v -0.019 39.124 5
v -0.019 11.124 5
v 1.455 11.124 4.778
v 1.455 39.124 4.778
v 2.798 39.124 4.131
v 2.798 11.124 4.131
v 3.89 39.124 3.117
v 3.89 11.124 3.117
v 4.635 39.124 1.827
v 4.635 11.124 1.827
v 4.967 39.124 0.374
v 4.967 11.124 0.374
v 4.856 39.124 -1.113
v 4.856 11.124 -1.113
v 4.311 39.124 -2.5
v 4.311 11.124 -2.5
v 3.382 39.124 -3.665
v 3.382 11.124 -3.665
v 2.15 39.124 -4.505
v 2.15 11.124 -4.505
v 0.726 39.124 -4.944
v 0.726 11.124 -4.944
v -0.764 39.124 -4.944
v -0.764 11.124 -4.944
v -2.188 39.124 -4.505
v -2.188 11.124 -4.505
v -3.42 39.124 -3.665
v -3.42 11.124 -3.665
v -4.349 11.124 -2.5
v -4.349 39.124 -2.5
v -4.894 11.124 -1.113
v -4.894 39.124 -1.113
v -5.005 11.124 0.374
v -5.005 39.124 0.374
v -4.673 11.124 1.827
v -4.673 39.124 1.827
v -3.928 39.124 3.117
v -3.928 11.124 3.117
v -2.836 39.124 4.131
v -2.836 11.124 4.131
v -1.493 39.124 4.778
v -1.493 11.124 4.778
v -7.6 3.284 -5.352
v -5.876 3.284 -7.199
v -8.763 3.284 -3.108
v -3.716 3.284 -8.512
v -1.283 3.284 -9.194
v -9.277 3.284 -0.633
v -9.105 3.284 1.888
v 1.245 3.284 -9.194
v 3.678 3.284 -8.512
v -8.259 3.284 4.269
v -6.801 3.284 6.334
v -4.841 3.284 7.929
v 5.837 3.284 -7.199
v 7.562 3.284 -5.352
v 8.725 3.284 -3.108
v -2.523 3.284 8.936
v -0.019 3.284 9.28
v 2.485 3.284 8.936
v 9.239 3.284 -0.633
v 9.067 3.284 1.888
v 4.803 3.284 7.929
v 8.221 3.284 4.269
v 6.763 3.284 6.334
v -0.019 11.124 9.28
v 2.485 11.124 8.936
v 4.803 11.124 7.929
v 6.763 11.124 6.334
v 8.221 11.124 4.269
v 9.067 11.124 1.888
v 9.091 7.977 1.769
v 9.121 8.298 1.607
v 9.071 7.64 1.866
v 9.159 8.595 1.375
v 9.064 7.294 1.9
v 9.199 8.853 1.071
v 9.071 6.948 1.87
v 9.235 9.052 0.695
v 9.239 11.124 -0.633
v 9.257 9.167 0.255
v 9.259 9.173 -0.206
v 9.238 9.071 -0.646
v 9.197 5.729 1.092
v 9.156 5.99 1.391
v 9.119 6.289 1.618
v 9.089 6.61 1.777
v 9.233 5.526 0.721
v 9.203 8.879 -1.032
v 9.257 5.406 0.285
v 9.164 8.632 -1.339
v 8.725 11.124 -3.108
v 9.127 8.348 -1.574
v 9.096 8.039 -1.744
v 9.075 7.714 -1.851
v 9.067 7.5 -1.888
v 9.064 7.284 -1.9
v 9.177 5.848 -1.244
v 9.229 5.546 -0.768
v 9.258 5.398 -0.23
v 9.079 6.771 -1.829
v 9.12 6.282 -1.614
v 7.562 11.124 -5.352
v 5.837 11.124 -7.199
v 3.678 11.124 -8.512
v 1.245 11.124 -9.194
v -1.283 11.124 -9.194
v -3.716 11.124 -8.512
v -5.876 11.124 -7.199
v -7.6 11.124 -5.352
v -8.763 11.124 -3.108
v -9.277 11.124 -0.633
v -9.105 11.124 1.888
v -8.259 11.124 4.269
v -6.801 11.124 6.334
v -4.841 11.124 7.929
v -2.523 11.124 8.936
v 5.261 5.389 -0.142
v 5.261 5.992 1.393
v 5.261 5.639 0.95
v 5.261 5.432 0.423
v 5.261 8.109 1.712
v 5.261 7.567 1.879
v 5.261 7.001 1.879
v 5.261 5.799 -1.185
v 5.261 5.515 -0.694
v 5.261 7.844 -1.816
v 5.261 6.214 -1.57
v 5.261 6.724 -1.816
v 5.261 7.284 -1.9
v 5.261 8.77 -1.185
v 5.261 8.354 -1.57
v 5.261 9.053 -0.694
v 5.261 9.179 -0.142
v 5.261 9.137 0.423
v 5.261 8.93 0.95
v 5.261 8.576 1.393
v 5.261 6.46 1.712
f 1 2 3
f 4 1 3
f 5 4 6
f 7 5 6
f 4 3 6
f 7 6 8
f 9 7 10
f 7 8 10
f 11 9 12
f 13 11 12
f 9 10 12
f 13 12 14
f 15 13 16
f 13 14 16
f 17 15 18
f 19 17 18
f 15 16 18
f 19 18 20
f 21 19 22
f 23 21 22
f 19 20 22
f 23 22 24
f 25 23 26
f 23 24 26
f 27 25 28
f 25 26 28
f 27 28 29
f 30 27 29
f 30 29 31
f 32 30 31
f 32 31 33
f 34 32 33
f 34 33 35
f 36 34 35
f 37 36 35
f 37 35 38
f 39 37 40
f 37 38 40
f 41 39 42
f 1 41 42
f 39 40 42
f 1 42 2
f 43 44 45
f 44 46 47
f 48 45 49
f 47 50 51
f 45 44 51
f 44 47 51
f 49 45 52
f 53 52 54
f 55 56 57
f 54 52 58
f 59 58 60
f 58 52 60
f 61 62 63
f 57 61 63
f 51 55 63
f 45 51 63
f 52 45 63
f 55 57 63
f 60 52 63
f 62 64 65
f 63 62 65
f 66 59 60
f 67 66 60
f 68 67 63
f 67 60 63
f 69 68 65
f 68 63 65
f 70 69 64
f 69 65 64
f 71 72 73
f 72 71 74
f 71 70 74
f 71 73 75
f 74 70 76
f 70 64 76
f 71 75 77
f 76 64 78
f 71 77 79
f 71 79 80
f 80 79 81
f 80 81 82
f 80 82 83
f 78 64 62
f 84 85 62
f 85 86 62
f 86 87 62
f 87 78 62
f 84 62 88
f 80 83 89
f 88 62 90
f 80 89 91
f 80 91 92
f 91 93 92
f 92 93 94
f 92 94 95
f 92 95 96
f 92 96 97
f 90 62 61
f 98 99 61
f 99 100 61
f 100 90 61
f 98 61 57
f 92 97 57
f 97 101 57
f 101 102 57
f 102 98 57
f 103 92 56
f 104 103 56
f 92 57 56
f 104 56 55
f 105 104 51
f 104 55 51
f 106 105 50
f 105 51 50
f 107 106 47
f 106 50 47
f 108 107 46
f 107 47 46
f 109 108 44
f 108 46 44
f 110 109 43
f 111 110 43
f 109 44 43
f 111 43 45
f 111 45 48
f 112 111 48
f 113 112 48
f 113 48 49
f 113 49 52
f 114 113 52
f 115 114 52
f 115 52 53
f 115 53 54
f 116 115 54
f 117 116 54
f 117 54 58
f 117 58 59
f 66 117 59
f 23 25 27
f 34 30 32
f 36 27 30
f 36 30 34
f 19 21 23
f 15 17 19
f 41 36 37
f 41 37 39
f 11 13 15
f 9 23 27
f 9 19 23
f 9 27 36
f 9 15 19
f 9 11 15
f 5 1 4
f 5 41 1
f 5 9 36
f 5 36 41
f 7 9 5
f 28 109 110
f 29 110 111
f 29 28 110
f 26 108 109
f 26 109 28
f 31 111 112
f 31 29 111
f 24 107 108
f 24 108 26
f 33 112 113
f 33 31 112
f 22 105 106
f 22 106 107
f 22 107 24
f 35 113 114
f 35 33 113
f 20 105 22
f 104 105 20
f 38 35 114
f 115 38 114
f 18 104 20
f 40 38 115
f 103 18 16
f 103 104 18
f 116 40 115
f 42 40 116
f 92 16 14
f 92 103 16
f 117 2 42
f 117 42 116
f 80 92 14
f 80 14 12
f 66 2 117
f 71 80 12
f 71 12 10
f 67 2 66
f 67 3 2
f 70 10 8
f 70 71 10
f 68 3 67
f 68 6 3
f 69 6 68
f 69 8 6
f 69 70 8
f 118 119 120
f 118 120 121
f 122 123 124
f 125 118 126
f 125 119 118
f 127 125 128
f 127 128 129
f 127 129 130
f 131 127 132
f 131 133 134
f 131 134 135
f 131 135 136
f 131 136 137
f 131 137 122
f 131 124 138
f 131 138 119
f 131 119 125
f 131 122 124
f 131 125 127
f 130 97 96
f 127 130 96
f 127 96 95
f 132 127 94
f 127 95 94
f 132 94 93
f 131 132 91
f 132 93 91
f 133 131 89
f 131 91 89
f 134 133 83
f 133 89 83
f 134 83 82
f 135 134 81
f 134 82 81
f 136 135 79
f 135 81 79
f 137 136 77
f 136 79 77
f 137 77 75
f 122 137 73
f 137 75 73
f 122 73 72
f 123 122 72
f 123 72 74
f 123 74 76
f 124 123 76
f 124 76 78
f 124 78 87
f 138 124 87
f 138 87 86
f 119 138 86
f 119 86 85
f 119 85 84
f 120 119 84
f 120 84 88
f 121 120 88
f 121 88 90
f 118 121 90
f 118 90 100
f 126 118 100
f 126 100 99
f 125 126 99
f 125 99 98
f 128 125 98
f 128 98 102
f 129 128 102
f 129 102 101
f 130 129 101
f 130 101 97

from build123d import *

# Parameters (mm, degrees)
SKETCH2_R           = 11.6
BOSS_EXTRUDE1_DEPTH = 9.8
SKETCH7_R           = 6.25
BOSS_EXTRUDE3_DEPTH = 35
SKETCH3_R           = 2.375
CUT_EXTRUDE1_DEPTH  = 5
SCALE1_SCALE        = 0.8


with BuildPart() as part:
    # Sketch2 → Boss-Extrude1 (new body)
    with BuildSketch(Plane(origin=(0, 0, 0), x_dir=(1, 0, 0), z_dir=(0, 1, 0))):
        with Locations(Location((0, 0, 0), (0, 0, 270))):
            Circle(SKETCH2_R)
    extrude(amount=BOSS_EXTRUDE1_DEPTH)

    # Sketch7 → Boss-Extrude3 (add)
    with BuildSketch(Plane(origin=(0, 9.8, 0), x_dir=(1, 0, 0), z_dir=(0, 1, 0))):
        with Locations(Location((0, 0, 0), (0, 0, 270))):
            Circle(SKETCH7_R)
    extrude(amount=BOSS_EXTRUDE3_DEPTH)

    # Sketch3 → Cut-Extrude1 (cut)
    with BuildSketch(Plane(origin=(11.6, 0, 0), x_dir=(0, 0, -1), z_dir=(1, 0, 0))):
        with Locations((0, 5)):
            Circle(SKETCH3_R)
    extrude(amount=-CUT_EXTRUDE1_DEPTH, mode=Mode.SUBTRACT)


with BuildPart() as part_1:
    # Scale1: scaled about (-0.095056518, 16.420693109, 4.829e-06)
    add(part.part.scale(SCALE1_SCALE).moved(Location((-0.019011304, 3.284138622, 9.66e-07))))


solid = part_1.part
